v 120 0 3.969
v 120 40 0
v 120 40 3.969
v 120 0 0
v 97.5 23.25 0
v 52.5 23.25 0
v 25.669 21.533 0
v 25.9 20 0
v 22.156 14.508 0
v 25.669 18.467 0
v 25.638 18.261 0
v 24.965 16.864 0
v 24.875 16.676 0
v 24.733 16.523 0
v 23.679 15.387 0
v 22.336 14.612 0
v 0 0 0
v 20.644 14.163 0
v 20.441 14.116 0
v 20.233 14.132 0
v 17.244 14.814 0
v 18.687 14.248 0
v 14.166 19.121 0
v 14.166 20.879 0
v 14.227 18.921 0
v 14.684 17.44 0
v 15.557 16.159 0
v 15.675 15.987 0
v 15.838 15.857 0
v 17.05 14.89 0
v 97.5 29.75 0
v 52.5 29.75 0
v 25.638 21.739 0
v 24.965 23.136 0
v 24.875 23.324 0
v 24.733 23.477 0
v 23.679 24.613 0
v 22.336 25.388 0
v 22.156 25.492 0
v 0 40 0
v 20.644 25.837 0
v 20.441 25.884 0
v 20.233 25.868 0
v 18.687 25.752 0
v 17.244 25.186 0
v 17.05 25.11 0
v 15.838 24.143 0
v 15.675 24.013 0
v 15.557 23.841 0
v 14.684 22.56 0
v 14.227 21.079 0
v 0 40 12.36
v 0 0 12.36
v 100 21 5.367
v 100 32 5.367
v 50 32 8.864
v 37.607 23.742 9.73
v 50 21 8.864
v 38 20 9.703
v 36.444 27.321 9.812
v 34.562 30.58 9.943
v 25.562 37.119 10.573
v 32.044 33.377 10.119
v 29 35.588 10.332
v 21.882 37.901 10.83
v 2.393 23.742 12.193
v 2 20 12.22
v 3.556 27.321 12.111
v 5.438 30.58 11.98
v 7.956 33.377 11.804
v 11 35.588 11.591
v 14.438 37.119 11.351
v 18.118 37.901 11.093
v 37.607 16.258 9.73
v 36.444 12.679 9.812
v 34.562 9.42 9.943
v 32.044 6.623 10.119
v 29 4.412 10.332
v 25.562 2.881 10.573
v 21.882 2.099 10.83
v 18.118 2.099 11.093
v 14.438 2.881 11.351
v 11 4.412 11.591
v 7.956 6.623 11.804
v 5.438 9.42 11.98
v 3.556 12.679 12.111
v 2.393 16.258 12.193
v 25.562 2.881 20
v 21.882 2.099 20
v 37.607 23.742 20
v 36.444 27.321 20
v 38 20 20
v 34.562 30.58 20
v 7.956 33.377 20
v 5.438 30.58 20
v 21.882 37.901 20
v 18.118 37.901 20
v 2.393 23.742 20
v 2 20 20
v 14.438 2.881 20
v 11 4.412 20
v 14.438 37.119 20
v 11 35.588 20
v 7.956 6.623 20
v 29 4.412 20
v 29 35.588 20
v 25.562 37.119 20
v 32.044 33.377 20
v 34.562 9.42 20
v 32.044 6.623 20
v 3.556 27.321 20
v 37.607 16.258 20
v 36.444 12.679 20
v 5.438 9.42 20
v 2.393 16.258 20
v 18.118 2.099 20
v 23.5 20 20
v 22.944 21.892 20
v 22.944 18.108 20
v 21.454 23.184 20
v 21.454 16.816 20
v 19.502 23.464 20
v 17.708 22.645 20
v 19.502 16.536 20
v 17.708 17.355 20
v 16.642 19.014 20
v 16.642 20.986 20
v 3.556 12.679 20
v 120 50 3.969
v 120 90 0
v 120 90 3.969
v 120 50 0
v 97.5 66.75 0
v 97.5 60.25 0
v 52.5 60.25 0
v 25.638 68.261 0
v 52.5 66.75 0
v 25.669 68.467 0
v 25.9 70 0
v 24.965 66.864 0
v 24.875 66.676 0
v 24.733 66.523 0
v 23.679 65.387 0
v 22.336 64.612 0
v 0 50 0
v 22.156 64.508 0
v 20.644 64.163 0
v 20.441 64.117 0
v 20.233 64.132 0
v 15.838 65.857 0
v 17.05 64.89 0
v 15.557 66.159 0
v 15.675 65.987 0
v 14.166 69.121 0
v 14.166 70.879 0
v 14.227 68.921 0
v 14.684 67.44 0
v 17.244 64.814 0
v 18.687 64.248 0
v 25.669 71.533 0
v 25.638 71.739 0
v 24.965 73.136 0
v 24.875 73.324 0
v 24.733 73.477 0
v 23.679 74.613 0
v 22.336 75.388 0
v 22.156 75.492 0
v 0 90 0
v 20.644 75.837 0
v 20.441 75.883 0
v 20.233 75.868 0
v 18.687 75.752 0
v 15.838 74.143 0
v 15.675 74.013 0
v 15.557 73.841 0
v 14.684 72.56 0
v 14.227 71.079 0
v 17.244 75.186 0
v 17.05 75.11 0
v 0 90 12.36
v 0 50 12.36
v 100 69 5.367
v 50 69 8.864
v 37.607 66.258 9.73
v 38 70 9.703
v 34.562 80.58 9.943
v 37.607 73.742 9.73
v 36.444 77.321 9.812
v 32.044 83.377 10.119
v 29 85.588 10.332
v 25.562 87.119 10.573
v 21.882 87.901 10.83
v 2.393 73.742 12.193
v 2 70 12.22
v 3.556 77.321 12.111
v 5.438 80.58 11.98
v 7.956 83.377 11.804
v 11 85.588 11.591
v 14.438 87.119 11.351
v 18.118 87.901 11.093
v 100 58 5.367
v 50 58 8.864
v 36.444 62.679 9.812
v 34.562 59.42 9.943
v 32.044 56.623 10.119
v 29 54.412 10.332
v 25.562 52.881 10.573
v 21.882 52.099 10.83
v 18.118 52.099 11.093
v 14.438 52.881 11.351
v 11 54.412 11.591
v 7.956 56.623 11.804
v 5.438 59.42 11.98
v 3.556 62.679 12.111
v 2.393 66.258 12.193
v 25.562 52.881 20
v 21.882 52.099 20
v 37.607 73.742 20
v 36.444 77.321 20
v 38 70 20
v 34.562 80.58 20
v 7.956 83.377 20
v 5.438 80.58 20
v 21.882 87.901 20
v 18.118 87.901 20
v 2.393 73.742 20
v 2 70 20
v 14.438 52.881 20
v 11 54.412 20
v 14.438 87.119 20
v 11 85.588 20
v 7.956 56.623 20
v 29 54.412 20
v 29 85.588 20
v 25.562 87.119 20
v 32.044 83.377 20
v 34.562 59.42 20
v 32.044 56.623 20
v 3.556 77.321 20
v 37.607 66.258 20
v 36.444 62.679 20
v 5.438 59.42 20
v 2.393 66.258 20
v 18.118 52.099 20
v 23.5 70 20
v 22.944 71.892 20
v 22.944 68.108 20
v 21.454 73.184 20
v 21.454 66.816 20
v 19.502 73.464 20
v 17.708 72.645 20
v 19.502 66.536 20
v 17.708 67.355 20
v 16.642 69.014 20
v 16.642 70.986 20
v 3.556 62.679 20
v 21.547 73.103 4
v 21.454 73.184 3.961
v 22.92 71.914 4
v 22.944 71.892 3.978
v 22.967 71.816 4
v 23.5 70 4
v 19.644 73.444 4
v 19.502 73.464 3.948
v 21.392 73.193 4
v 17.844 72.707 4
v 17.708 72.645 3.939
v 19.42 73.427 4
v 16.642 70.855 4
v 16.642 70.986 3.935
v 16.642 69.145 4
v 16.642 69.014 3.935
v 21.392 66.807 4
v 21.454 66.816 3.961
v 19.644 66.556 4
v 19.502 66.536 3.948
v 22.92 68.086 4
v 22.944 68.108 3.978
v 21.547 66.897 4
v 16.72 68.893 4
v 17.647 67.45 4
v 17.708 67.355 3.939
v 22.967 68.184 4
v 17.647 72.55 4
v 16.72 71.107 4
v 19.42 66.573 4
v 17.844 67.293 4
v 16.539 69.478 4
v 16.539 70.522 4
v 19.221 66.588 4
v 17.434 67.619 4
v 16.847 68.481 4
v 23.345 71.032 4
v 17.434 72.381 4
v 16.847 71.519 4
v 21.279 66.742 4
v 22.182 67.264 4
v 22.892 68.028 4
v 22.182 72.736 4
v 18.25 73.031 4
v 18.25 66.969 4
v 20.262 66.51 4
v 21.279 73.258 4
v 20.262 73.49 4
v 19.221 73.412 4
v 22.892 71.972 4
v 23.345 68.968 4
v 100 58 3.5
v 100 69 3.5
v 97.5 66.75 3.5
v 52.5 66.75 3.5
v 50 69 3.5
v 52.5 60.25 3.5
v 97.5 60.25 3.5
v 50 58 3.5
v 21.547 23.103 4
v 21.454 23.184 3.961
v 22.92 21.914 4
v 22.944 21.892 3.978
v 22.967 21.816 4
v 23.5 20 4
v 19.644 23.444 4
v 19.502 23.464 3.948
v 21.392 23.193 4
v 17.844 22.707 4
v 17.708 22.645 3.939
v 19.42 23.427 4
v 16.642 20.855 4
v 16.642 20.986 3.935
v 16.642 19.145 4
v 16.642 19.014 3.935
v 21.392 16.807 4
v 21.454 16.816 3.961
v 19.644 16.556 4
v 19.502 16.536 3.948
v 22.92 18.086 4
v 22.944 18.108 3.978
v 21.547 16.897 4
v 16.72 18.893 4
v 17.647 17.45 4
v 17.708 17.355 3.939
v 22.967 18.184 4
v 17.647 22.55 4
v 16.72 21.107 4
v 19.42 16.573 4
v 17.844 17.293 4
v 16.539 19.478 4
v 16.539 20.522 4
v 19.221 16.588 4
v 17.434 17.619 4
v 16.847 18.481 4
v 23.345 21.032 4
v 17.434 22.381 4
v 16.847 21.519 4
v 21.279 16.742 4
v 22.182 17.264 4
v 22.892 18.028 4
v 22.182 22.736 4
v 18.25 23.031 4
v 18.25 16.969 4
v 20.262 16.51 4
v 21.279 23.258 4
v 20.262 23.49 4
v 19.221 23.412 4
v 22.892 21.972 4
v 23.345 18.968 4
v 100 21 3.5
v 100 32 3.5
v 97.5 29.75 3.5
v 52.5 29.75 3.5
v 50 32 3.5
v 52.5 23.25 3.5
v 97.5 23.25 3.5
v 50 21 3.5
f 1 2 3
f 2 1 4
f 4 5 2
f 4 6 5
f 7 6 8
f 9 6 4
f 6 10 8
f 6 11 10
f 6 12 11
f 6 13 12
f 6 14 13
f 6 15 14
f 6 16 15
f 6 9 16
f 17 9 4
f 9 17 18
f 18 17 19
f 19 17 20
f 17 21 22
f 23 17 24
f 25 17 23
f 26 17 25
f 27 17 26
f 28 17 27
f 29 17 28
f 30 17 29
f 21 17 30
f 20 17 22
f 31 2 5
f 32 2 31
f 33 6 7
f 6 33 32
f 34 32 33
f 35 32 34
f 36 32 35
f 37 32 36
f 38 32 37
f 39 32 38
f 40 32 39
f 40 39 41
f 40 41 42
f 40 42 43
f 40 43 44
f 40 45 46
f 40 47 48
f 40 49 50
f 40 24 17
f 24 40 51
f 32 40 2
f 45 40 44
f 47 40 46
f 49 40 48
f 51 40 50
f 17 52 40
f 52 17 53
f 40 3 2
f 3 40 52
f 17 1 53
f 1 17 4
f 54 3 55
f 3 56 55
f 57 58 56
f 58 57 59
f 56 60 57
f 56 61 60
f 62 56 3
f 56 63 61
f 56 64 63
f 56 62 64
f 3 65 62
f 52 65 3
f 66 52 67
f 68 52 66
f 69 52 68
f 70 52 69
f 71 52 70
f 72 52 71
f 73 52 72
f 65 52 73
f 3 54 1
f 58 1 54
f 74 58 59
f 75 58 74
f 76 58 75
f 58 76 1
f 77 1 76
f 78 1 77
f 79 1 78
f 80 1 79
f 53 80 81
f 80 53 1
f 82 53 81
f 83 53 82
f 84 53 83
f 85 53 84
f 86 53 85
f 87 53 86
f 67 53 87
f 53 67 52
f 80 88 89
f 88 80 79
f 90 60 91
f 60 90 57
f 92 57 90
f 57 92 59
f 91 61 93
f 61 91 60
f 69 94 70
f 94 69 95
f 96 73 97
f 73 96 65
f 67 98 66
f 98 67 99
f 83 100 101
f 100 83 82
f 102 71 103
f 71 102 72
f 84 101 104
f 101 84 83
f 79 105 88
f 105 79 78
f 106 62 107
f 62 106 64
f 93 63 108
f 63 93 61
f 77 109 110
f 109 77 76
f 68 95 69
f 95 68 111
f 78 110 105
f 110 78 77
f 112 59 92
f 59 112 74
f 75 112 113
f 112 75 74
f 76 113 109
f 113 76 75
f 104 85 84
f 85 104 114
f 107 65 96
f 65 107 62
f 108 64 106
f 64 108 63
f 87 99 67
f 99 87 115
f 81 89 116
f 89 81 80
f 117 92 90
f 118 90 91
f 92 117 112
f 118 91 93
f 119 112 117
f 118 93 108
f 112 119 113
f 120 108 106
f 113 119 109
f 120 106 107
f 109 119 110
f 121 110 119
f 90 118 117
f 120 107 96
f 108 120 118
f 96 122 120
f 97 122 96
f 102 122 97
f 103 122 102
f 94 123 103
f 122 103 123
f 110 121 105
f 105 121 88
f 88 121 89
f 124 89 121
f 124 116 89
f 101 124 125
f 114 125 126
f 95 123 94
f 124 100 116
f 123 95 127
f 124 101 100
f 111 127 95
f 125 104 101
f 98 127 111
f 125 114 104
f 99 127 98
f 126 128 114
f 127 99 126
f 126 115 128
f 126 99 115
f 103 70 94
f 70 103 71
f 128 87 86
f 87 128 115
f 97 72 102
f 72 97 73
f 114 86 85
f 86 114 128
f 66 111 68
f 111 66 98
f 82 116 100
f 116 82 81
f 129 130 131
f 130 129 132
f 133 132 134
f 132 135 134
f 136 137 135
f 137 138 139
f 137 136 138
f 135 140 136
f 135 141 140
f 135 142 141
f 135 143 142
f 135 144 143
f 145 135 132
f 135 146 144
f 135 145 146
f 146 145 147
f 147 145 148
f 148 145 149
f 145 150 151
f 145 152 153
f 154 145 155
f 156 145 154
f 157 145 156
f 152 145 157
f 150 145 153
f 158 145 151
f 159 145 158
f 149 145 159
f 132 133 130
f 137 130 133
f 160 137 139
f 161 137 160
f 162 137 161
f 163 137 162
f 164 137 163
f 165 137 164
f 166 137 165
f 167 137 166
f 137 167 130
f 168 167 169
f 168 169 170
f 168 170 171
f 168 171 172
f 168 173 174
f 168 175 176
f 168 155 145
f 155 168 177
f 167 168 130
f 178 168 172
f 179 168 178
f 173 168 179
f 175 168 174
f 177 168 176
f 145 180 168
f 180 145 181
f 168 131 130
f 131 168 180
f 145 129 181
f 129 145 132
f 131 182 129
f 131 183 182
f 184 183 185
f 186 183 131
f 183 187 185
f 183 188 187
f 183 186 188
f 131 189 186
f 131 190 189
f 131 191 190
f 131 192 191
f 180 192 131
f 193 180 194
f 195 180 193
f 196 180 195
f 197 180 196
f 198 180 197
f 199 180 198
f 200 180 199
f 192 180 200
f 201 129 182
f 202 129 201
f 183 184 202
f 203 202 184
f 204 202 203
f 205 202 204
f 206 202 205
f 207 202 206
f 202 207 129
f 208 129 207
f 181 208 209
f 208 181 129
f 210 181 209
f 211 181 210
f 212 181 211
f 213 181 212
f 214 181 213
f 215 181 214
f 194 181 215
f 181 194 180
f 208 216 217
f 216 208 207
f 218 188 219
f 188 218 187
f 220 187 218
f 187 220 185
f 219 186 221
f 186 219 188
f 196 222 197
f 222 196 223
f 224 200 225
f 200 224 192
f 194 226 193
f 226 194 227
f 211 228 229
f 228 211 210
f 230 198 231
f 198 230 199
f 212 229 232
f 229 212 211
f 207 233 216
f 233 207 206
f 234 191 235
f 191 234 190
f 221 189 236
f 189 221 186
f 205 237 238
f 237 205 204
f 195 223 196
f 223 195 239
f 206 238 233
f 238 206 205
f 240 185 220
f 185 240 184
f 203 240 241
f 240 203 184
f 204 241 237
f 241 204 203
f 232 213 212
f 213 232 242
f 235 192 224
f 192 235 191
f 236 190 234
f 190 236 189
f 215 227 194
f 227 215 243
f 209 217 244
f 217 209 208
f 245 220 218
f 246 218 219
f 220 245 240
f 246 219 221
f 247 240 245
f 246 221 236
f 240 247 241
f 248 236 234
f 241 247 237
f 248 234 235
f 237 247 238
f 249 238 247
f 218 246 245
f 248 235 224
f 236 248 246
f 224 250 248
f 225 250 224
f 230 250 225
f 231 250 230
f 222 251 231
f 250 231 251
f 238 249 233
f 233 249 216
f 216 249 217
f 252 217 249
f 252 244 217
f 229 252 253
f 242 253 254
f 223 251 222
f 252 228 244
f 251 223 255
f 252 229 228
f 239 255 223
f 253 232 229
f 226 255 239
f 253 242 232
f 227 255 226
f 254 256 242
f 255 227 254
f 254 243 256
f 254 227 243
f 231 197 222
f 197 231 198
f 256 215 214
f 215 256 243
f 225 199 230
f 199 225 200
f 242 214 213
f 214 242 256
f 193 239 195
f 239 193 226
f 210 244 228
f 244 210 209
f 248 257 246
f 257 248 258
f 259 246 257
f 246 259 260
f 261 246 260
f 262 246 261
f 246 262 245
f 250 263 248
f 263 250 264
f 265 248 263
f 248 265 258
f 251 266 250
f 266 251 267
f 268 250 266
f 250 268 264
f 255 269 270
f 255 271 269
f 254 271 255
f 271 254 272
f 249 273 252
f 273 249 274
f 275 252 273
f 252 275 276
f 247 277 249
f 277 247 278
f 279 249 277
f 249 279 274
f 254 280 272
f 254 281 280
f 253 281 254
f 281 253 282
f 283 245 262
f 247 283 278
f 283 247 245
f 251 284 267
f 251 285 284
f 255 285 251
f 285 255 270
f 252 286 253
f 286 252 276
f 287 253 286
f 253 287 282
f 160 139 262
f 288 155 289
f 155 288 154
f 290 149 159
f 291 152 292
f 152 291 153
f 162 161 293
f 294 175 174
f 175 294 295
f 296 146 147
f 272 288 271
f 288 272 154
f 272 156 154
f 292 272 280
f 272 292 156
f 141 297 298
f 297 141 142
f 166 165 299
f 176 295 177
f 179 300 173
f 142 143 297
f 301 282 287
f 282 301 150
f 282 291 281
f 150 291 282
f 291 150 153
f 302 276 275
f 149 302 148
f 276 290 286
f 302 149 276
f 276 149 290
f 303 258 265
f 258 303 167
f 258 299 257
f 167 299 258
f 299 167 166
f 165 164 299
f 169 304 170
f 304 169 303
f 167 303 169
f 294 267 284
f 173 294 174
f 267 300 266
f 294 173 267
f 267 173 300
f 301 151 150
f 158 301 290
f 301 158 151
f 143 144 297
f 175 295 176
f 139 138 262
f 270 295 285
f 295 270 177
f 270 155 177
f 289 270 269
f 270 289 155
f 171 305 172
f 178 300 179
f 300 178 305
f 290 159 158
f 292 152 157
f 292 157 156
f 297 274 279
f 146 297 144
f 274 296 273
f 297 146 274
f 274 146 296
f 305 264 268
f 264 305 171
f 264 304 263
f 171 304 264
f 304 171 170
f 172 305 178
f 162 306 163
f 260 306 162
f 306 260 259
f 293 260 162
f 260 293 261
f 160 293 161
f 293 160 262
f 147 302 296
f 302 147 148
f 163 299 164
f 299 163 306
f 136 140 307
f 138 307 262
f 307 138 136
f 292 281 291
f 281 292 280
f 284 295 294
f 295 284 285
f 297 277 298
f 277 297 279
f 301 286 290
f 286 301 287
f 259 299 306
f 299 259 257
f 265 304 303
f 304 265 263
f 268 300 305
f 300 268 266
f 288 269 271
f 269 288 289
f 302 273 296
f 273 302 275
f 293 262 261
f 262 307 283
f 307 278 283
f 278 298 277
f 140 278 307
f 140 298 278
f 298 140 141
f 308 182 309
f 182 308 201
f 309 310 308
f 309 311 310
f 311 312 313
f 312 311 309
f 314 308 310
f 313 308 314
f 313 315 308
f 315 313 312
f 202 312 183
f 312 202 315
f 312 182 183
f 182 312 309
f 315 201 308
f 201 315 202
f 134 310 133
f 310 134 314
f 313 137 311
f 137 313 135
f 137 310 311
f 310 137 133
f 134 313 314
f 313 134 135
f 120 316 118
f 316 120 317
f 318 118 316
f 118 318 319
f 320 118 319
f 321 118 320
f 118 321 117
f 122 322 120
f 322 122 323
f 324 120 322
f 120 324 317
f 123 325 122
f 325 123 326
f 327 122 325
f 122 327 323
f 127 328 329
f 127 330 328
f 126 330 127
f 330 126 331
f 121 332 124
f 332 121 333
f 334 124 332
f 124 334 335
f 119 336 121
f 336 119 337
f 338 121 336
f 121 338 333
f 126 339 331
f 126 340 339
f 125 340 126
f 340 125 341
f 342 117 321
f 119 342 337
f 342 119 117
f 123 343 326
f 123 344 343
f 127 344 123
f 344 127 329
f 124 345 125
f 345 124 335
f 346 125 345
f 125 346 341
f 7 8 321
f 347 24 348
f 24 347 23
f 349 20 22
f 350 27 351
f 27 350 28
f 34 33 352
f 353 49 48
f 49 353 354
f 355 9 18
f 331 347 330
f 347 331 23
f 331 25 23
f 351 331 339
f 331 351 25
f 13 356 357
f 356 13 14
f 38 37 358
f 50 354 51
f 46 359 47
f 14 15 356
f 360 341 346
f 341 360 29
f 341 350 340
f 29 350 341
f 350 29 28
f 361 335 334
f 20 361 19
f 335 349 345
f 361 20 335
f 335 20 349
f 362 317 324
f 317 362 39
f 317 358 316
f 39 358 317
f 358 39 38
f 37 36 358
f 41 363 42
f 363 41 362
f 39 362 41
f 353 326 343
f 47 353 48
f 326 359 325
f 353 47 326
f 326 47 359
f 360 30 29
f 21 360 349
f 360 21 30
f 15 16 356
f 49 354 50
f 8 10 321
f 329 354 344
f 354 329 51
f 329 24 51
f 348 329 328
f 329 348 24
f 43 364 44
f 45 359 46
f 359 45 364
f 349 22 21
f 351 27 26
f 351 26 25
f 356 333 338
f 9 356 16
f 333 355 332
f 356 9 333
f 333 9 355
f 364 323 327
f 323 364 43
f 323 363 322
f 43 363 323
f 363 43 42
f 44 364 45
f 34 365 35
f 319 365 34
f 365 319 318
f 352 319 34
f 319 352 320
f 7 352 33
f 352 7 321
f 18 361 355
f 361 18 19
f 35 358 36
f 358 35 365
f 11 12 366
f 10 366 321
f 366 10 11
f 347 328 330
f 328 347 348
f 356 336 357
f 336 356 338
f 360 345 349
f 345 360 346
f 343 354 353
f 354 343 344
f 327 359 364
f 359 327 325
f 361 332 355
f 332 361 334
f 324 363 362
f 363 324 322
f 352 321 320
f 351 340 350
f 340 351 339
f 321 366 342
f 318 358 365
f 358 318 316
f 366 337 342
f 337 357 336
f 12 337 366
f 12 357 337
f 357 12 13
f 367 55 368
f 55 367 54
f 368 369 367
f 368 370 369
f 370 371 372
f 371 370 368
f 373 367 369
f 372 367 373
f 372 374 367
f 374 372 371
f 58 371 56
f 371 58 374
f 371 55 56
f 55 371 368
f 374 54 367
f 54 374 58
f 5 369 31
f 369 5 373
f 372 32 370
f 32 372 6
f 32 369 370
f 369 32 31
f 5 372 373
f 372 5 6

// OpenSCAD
module all(){
difference(){
color("red")
cube([120,40,22.5]);
    translate([-2,-1,12.5])
rotate([0,4,0])
color("blue")
cube([130,45,20]);
};
translate([20,20,0])
color ("green")
cylinder(20,18,18);
};

translate([0,50,0]){
difference(){
    all();
    translate([20,20,-1])
    cylinder(32.5,3.5,3.5);
    translate([20,20,-1])
    cylinder(5,6.5,3.5);
    translate([50,8,3.5])
    color("aqua")
    cube([50,11,10]);
    translate([52.5,10.25,-1])
    color("aqua")
    cube([45,6.5,10]);

};};
difference(){
    all();
    translate([20,20,-1])
    cylinder(32.5,3.5,3.5);
    translate([20,20,-1])
    cylinder(5,6.5,3.5);
    translate([50,21,3.5])
    color("aqua")
    cube([50,11,10]);
    translate([52.5,23.25,-1])
    color("aqua")
    cube([45,6.5,10]);

};
